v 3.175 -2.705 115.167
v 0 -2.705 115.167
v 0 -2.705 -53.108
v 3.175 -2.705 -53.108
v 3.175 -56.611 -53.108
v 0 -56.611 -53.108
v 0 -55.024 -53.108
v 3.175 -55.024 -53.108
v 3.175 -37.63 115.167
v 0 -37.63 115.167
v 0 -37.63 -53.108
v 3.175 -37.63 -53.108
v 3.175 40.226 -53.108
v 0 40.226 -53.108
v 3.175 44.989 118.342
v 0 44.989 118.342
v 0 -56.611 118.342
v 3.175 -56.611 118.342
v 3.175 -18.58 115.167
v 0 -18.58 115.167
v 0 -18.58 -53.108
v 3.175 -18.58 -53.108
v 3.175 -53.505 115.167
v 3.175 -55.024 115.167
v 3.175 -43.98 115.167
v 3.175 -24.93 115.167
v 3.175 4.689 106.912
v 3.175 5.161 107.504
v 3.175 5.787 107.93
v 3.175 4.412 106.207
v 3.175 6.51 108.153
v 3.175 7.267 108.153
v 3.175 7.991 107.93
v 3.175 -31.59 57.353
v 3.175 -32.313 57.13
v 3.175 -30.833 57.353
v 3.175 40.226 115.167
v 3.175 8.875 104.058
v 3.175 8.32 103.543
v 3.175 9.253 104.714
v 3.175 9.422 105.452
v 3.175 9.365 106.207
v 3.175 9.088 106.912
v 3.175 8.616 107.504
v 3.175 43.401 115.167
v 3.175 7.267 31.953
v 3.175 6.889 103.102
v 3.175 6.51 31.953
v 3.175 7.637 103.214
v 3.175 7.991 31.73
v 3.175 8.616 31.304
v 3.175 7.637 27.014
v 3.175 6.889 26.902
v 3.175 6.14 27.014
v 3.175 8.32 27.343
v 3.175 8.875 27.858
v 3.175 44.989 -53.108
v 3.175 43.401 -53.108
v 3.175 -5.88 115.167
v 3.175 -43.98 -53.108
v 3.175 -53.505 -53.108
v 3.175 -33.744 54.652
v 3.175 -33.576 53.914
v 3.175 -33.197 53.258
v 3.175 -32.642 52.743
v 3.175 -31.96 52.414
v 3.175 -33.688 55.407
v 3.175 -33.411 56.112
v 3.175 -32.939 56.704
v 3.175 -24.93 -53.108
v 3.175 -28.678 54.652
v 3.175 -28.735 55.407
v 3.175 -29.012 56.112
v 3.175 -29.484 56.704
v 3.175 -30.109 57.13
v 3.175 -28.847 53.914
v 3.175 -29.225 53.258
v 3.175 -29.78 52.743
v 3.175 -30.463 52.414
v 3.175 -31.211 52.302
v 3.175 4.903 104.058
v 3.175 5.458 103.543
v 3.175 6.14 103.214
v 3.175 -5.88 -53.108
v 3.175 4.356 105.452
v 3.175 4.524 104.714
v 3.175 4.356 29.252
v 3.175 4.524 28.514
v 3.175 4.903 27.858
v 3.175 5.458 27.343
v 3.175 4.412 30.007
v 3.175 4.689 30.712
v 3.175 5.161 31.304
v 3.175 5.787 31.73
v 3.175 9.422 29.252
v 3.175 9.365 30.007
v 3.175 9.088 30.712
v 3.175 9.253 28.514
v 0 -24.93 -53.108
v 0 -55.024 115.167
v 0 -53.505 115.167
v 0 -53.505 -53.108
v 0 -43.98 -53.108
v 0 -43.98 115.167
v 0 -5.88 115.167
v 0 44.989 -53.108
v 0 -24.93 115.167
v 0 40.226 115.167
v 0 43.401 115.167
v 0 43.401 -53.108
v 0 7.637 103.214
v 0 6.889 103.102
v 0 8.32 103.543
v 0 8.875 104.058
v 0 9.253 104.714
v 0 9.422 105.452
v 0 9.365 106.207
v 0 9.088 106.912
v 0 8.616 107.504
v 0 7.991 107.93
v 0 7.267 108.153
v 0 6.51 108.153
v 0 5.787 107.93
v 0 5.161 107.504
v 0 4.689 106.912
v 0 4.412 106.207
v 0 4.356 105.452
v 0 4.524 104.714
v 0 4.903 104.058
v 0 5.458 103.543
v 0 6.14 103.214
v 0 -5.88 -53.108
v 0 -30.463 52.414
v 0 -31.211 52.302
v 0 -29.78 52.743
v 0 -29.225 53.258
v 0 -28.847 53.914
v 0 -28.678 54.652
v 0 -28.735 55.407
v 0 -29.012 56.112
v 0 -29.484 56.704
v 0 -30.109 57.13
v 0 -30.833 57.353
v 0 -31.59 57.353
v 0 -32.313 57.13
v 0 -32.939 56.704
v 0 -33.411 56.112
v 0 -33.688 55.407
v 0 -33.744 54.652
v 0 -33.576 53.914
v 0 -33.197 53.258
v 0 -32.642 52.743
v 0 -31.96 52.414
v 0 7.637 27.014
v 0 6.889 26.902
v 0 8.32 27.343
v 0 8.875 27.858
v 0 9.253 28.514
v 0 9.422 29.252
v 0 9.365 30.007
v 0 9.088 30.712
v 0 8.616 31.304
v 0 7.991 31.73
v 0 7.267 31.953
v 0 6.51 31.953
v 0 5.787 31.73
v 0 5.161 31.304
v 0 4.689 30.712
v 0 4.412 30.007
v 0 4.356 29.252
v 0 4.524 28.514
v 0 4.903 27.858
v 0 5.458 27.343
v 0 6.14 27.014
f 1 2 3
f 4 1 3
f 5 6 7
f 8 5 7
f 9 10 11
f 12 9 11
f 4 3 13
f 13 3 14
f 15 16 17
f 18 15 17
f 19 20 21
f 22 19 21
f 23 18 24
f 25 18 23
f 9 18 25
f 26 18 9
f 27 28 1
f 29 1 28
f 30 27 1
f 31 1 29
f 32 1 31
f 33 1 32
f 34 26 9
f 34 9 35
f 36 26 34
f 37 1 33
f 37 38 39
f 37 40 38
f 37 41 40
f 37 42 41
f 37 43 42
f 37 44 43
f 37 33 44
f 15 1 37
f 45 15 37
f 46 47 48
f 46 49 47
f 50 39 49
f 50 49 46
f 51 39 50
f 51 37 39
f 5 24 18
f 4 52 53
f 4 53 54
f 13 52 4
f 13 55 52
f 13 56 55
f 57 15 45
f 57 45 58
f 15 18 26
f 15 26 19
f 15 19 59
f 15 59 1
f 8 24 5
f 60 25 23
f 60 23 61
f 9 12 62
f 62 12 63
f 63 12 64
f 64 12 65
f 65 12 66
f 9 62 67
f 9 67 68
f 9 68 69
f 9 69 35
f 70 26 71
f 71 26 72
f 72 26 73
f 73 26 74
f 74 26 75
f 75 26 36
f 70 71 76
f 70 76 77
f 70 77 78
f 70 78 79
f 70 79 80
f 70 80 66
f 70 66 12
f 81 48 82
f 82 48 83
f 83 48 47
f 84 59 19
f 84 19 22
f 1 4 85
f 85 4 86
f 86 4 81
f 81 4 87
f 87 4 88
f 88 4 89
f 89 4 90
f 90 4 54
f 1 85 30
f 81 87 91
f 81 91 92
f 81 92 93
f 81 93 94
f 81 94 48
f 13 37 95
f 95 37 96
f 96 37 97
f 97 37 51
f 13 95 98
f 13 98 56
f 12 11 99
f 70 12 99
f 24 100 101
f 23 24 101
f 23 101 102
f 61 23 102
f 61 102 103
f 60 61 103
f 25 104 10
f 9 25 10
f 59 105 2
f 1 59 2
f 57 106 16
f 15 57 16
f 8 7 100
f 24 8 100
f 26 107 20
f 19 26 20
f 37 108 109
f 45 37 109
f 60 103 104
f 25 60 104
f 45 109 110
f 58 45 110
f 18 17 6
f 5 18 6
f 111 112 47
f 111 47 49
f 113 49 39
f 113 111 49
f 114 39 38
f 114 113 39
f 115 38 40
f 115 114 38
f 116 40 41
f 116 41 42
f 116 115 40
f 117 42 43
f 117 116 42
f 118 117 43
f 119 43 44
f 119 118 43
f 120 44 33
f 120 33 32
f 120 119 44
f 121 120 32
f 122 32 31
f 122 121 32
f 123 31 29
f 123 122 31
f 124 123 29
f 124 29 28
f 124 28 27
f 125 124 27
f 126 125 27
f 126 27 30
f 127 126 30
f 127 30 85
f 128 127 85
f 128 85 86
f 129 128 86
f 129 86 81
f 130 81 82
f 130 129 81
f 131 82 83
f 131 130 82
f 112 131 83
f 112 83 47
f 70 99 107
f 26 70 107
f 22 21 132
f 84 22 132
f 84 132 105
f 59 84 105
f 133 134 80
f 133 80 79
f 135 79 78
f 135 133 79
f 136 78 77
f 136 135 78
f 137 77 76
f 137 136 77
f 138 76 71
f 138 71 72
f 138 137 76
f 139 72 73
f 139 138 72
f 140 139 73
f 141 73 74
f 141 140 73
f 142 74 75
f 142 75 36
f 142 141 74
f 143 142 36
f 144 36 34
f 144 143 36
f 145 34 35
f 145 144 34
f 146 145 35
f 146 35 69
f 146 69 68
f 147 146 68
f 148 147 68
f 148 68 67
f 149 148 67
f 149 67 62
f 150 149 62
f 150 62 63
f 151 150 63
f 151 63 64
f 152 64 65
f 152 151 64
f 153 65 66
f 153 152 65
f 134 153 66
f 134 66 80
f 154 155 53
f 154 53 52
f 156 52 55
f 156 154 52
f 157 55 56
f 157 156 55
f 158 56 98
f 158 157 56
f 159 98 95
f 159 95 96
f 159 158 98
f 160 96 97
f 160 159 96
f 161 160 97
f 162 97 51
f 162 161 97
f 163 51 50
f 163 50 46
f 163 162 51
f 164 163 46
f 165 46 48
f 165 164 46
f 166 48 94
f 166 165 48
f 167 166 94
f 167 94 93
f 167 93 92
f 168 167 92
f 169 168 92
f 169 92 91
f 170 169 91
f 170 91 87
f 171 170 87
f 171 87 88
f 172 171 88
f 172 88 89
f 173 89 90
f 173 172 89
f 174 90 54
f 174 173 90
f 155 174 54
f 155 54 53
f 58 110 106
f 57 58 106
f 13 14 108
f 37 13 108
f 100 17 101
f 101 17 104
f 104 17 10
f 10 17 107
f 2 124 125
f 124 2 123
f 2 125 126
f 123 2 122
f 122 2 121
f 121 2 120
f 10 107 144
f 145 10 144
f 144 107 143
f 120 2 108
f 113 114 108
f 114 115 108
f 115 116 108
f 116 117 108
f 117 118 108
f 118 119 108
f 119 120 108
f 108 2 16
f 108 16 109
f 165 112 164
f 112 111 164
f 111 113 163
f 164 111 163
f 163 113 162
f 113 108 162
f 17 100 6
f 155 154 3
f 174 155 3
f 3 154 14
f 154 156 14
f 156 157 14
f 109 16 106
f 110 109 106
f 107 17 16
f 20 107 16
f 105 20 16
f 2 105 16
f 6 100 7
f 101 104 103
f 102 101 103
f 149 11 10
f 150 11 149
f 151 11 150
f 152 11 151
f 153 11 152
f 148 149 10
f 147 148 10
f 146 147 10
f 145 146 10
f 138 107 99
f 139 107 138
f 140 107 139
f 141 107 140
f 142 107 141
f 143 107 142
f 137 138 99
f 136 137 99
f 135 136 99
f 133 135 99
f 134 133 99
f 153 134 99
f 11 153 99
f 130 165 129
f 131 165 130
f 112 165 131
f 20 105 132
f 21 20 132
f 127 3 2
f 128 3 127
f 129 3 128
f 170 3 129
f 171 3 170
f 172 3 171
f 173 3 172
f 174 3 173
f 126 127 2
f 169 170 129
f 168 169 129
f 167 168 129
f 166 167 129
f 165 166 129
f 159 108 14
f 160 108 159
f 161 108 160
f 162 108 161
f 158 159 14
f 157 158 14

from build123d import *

# Parameters (mm, degrees)
SKETCH1_R           = 2.54
BOSS_EXTRUDE1_DEPTH = 3.175


with BuildPart() as part:
    # Sketch1 → Boss-Extrude1 (new body)
    with BuildSketch(Plane(origin=(0, 0, 0), x_dir=(0, 0, -1), z_dir=(1, 0, 0))):
        Polygon((53.108364313, 44.988743573), (-118.341635687, 44.988743573), (-118.341635687, -56.611256427), (53.108364313, -56.611256427), (53.108364313, -55.023756427), (-115.166635687, -55.023756427), (-115.166635687, -53.504836427), (53.108364313, -53.504836427), (53.108364313, -50.261256427), (53.108364313, -43.979836427), (-115.166635687, -43.979836427), (-115.166635687, -37.629836427), (53.108364313, -37.629836427), (53.108364313, -24.929836427), (-115.166635687, -24.929836427), (-115.166635687, -18.579836427), (53.108364313, -18.579836427), (53.108364313, -5.879836427), (-115.166635687, -5.879836427), (-115.166635687, -2.704836427), (53.108364313, -2.704836427), (53.108364313, 25.938743573), (53.108364313, 40.226243573), (-115.166635687, 40.226243573), (-115.166635687, 43.401243573), (53.108364313, 43.401243573), align=None)
        with Locations((-54.841635687, -31.211256427)):
            Circle(SKETCH1_R, mode=Mode.SUBTRACT)
        with Locations((-105.641635687, 6.888743573)):
            Circle(SKETCH1_R, mode=Mode.SUBTRACT)
        with Locations((-29.441635687, 6.888743573)):
            Circle(SKETCH1_R, mode=Mode.SUBTRACT)
    extrude(amount=BOSS_EXTRUDE1_DEPTH)


solid = part.part
